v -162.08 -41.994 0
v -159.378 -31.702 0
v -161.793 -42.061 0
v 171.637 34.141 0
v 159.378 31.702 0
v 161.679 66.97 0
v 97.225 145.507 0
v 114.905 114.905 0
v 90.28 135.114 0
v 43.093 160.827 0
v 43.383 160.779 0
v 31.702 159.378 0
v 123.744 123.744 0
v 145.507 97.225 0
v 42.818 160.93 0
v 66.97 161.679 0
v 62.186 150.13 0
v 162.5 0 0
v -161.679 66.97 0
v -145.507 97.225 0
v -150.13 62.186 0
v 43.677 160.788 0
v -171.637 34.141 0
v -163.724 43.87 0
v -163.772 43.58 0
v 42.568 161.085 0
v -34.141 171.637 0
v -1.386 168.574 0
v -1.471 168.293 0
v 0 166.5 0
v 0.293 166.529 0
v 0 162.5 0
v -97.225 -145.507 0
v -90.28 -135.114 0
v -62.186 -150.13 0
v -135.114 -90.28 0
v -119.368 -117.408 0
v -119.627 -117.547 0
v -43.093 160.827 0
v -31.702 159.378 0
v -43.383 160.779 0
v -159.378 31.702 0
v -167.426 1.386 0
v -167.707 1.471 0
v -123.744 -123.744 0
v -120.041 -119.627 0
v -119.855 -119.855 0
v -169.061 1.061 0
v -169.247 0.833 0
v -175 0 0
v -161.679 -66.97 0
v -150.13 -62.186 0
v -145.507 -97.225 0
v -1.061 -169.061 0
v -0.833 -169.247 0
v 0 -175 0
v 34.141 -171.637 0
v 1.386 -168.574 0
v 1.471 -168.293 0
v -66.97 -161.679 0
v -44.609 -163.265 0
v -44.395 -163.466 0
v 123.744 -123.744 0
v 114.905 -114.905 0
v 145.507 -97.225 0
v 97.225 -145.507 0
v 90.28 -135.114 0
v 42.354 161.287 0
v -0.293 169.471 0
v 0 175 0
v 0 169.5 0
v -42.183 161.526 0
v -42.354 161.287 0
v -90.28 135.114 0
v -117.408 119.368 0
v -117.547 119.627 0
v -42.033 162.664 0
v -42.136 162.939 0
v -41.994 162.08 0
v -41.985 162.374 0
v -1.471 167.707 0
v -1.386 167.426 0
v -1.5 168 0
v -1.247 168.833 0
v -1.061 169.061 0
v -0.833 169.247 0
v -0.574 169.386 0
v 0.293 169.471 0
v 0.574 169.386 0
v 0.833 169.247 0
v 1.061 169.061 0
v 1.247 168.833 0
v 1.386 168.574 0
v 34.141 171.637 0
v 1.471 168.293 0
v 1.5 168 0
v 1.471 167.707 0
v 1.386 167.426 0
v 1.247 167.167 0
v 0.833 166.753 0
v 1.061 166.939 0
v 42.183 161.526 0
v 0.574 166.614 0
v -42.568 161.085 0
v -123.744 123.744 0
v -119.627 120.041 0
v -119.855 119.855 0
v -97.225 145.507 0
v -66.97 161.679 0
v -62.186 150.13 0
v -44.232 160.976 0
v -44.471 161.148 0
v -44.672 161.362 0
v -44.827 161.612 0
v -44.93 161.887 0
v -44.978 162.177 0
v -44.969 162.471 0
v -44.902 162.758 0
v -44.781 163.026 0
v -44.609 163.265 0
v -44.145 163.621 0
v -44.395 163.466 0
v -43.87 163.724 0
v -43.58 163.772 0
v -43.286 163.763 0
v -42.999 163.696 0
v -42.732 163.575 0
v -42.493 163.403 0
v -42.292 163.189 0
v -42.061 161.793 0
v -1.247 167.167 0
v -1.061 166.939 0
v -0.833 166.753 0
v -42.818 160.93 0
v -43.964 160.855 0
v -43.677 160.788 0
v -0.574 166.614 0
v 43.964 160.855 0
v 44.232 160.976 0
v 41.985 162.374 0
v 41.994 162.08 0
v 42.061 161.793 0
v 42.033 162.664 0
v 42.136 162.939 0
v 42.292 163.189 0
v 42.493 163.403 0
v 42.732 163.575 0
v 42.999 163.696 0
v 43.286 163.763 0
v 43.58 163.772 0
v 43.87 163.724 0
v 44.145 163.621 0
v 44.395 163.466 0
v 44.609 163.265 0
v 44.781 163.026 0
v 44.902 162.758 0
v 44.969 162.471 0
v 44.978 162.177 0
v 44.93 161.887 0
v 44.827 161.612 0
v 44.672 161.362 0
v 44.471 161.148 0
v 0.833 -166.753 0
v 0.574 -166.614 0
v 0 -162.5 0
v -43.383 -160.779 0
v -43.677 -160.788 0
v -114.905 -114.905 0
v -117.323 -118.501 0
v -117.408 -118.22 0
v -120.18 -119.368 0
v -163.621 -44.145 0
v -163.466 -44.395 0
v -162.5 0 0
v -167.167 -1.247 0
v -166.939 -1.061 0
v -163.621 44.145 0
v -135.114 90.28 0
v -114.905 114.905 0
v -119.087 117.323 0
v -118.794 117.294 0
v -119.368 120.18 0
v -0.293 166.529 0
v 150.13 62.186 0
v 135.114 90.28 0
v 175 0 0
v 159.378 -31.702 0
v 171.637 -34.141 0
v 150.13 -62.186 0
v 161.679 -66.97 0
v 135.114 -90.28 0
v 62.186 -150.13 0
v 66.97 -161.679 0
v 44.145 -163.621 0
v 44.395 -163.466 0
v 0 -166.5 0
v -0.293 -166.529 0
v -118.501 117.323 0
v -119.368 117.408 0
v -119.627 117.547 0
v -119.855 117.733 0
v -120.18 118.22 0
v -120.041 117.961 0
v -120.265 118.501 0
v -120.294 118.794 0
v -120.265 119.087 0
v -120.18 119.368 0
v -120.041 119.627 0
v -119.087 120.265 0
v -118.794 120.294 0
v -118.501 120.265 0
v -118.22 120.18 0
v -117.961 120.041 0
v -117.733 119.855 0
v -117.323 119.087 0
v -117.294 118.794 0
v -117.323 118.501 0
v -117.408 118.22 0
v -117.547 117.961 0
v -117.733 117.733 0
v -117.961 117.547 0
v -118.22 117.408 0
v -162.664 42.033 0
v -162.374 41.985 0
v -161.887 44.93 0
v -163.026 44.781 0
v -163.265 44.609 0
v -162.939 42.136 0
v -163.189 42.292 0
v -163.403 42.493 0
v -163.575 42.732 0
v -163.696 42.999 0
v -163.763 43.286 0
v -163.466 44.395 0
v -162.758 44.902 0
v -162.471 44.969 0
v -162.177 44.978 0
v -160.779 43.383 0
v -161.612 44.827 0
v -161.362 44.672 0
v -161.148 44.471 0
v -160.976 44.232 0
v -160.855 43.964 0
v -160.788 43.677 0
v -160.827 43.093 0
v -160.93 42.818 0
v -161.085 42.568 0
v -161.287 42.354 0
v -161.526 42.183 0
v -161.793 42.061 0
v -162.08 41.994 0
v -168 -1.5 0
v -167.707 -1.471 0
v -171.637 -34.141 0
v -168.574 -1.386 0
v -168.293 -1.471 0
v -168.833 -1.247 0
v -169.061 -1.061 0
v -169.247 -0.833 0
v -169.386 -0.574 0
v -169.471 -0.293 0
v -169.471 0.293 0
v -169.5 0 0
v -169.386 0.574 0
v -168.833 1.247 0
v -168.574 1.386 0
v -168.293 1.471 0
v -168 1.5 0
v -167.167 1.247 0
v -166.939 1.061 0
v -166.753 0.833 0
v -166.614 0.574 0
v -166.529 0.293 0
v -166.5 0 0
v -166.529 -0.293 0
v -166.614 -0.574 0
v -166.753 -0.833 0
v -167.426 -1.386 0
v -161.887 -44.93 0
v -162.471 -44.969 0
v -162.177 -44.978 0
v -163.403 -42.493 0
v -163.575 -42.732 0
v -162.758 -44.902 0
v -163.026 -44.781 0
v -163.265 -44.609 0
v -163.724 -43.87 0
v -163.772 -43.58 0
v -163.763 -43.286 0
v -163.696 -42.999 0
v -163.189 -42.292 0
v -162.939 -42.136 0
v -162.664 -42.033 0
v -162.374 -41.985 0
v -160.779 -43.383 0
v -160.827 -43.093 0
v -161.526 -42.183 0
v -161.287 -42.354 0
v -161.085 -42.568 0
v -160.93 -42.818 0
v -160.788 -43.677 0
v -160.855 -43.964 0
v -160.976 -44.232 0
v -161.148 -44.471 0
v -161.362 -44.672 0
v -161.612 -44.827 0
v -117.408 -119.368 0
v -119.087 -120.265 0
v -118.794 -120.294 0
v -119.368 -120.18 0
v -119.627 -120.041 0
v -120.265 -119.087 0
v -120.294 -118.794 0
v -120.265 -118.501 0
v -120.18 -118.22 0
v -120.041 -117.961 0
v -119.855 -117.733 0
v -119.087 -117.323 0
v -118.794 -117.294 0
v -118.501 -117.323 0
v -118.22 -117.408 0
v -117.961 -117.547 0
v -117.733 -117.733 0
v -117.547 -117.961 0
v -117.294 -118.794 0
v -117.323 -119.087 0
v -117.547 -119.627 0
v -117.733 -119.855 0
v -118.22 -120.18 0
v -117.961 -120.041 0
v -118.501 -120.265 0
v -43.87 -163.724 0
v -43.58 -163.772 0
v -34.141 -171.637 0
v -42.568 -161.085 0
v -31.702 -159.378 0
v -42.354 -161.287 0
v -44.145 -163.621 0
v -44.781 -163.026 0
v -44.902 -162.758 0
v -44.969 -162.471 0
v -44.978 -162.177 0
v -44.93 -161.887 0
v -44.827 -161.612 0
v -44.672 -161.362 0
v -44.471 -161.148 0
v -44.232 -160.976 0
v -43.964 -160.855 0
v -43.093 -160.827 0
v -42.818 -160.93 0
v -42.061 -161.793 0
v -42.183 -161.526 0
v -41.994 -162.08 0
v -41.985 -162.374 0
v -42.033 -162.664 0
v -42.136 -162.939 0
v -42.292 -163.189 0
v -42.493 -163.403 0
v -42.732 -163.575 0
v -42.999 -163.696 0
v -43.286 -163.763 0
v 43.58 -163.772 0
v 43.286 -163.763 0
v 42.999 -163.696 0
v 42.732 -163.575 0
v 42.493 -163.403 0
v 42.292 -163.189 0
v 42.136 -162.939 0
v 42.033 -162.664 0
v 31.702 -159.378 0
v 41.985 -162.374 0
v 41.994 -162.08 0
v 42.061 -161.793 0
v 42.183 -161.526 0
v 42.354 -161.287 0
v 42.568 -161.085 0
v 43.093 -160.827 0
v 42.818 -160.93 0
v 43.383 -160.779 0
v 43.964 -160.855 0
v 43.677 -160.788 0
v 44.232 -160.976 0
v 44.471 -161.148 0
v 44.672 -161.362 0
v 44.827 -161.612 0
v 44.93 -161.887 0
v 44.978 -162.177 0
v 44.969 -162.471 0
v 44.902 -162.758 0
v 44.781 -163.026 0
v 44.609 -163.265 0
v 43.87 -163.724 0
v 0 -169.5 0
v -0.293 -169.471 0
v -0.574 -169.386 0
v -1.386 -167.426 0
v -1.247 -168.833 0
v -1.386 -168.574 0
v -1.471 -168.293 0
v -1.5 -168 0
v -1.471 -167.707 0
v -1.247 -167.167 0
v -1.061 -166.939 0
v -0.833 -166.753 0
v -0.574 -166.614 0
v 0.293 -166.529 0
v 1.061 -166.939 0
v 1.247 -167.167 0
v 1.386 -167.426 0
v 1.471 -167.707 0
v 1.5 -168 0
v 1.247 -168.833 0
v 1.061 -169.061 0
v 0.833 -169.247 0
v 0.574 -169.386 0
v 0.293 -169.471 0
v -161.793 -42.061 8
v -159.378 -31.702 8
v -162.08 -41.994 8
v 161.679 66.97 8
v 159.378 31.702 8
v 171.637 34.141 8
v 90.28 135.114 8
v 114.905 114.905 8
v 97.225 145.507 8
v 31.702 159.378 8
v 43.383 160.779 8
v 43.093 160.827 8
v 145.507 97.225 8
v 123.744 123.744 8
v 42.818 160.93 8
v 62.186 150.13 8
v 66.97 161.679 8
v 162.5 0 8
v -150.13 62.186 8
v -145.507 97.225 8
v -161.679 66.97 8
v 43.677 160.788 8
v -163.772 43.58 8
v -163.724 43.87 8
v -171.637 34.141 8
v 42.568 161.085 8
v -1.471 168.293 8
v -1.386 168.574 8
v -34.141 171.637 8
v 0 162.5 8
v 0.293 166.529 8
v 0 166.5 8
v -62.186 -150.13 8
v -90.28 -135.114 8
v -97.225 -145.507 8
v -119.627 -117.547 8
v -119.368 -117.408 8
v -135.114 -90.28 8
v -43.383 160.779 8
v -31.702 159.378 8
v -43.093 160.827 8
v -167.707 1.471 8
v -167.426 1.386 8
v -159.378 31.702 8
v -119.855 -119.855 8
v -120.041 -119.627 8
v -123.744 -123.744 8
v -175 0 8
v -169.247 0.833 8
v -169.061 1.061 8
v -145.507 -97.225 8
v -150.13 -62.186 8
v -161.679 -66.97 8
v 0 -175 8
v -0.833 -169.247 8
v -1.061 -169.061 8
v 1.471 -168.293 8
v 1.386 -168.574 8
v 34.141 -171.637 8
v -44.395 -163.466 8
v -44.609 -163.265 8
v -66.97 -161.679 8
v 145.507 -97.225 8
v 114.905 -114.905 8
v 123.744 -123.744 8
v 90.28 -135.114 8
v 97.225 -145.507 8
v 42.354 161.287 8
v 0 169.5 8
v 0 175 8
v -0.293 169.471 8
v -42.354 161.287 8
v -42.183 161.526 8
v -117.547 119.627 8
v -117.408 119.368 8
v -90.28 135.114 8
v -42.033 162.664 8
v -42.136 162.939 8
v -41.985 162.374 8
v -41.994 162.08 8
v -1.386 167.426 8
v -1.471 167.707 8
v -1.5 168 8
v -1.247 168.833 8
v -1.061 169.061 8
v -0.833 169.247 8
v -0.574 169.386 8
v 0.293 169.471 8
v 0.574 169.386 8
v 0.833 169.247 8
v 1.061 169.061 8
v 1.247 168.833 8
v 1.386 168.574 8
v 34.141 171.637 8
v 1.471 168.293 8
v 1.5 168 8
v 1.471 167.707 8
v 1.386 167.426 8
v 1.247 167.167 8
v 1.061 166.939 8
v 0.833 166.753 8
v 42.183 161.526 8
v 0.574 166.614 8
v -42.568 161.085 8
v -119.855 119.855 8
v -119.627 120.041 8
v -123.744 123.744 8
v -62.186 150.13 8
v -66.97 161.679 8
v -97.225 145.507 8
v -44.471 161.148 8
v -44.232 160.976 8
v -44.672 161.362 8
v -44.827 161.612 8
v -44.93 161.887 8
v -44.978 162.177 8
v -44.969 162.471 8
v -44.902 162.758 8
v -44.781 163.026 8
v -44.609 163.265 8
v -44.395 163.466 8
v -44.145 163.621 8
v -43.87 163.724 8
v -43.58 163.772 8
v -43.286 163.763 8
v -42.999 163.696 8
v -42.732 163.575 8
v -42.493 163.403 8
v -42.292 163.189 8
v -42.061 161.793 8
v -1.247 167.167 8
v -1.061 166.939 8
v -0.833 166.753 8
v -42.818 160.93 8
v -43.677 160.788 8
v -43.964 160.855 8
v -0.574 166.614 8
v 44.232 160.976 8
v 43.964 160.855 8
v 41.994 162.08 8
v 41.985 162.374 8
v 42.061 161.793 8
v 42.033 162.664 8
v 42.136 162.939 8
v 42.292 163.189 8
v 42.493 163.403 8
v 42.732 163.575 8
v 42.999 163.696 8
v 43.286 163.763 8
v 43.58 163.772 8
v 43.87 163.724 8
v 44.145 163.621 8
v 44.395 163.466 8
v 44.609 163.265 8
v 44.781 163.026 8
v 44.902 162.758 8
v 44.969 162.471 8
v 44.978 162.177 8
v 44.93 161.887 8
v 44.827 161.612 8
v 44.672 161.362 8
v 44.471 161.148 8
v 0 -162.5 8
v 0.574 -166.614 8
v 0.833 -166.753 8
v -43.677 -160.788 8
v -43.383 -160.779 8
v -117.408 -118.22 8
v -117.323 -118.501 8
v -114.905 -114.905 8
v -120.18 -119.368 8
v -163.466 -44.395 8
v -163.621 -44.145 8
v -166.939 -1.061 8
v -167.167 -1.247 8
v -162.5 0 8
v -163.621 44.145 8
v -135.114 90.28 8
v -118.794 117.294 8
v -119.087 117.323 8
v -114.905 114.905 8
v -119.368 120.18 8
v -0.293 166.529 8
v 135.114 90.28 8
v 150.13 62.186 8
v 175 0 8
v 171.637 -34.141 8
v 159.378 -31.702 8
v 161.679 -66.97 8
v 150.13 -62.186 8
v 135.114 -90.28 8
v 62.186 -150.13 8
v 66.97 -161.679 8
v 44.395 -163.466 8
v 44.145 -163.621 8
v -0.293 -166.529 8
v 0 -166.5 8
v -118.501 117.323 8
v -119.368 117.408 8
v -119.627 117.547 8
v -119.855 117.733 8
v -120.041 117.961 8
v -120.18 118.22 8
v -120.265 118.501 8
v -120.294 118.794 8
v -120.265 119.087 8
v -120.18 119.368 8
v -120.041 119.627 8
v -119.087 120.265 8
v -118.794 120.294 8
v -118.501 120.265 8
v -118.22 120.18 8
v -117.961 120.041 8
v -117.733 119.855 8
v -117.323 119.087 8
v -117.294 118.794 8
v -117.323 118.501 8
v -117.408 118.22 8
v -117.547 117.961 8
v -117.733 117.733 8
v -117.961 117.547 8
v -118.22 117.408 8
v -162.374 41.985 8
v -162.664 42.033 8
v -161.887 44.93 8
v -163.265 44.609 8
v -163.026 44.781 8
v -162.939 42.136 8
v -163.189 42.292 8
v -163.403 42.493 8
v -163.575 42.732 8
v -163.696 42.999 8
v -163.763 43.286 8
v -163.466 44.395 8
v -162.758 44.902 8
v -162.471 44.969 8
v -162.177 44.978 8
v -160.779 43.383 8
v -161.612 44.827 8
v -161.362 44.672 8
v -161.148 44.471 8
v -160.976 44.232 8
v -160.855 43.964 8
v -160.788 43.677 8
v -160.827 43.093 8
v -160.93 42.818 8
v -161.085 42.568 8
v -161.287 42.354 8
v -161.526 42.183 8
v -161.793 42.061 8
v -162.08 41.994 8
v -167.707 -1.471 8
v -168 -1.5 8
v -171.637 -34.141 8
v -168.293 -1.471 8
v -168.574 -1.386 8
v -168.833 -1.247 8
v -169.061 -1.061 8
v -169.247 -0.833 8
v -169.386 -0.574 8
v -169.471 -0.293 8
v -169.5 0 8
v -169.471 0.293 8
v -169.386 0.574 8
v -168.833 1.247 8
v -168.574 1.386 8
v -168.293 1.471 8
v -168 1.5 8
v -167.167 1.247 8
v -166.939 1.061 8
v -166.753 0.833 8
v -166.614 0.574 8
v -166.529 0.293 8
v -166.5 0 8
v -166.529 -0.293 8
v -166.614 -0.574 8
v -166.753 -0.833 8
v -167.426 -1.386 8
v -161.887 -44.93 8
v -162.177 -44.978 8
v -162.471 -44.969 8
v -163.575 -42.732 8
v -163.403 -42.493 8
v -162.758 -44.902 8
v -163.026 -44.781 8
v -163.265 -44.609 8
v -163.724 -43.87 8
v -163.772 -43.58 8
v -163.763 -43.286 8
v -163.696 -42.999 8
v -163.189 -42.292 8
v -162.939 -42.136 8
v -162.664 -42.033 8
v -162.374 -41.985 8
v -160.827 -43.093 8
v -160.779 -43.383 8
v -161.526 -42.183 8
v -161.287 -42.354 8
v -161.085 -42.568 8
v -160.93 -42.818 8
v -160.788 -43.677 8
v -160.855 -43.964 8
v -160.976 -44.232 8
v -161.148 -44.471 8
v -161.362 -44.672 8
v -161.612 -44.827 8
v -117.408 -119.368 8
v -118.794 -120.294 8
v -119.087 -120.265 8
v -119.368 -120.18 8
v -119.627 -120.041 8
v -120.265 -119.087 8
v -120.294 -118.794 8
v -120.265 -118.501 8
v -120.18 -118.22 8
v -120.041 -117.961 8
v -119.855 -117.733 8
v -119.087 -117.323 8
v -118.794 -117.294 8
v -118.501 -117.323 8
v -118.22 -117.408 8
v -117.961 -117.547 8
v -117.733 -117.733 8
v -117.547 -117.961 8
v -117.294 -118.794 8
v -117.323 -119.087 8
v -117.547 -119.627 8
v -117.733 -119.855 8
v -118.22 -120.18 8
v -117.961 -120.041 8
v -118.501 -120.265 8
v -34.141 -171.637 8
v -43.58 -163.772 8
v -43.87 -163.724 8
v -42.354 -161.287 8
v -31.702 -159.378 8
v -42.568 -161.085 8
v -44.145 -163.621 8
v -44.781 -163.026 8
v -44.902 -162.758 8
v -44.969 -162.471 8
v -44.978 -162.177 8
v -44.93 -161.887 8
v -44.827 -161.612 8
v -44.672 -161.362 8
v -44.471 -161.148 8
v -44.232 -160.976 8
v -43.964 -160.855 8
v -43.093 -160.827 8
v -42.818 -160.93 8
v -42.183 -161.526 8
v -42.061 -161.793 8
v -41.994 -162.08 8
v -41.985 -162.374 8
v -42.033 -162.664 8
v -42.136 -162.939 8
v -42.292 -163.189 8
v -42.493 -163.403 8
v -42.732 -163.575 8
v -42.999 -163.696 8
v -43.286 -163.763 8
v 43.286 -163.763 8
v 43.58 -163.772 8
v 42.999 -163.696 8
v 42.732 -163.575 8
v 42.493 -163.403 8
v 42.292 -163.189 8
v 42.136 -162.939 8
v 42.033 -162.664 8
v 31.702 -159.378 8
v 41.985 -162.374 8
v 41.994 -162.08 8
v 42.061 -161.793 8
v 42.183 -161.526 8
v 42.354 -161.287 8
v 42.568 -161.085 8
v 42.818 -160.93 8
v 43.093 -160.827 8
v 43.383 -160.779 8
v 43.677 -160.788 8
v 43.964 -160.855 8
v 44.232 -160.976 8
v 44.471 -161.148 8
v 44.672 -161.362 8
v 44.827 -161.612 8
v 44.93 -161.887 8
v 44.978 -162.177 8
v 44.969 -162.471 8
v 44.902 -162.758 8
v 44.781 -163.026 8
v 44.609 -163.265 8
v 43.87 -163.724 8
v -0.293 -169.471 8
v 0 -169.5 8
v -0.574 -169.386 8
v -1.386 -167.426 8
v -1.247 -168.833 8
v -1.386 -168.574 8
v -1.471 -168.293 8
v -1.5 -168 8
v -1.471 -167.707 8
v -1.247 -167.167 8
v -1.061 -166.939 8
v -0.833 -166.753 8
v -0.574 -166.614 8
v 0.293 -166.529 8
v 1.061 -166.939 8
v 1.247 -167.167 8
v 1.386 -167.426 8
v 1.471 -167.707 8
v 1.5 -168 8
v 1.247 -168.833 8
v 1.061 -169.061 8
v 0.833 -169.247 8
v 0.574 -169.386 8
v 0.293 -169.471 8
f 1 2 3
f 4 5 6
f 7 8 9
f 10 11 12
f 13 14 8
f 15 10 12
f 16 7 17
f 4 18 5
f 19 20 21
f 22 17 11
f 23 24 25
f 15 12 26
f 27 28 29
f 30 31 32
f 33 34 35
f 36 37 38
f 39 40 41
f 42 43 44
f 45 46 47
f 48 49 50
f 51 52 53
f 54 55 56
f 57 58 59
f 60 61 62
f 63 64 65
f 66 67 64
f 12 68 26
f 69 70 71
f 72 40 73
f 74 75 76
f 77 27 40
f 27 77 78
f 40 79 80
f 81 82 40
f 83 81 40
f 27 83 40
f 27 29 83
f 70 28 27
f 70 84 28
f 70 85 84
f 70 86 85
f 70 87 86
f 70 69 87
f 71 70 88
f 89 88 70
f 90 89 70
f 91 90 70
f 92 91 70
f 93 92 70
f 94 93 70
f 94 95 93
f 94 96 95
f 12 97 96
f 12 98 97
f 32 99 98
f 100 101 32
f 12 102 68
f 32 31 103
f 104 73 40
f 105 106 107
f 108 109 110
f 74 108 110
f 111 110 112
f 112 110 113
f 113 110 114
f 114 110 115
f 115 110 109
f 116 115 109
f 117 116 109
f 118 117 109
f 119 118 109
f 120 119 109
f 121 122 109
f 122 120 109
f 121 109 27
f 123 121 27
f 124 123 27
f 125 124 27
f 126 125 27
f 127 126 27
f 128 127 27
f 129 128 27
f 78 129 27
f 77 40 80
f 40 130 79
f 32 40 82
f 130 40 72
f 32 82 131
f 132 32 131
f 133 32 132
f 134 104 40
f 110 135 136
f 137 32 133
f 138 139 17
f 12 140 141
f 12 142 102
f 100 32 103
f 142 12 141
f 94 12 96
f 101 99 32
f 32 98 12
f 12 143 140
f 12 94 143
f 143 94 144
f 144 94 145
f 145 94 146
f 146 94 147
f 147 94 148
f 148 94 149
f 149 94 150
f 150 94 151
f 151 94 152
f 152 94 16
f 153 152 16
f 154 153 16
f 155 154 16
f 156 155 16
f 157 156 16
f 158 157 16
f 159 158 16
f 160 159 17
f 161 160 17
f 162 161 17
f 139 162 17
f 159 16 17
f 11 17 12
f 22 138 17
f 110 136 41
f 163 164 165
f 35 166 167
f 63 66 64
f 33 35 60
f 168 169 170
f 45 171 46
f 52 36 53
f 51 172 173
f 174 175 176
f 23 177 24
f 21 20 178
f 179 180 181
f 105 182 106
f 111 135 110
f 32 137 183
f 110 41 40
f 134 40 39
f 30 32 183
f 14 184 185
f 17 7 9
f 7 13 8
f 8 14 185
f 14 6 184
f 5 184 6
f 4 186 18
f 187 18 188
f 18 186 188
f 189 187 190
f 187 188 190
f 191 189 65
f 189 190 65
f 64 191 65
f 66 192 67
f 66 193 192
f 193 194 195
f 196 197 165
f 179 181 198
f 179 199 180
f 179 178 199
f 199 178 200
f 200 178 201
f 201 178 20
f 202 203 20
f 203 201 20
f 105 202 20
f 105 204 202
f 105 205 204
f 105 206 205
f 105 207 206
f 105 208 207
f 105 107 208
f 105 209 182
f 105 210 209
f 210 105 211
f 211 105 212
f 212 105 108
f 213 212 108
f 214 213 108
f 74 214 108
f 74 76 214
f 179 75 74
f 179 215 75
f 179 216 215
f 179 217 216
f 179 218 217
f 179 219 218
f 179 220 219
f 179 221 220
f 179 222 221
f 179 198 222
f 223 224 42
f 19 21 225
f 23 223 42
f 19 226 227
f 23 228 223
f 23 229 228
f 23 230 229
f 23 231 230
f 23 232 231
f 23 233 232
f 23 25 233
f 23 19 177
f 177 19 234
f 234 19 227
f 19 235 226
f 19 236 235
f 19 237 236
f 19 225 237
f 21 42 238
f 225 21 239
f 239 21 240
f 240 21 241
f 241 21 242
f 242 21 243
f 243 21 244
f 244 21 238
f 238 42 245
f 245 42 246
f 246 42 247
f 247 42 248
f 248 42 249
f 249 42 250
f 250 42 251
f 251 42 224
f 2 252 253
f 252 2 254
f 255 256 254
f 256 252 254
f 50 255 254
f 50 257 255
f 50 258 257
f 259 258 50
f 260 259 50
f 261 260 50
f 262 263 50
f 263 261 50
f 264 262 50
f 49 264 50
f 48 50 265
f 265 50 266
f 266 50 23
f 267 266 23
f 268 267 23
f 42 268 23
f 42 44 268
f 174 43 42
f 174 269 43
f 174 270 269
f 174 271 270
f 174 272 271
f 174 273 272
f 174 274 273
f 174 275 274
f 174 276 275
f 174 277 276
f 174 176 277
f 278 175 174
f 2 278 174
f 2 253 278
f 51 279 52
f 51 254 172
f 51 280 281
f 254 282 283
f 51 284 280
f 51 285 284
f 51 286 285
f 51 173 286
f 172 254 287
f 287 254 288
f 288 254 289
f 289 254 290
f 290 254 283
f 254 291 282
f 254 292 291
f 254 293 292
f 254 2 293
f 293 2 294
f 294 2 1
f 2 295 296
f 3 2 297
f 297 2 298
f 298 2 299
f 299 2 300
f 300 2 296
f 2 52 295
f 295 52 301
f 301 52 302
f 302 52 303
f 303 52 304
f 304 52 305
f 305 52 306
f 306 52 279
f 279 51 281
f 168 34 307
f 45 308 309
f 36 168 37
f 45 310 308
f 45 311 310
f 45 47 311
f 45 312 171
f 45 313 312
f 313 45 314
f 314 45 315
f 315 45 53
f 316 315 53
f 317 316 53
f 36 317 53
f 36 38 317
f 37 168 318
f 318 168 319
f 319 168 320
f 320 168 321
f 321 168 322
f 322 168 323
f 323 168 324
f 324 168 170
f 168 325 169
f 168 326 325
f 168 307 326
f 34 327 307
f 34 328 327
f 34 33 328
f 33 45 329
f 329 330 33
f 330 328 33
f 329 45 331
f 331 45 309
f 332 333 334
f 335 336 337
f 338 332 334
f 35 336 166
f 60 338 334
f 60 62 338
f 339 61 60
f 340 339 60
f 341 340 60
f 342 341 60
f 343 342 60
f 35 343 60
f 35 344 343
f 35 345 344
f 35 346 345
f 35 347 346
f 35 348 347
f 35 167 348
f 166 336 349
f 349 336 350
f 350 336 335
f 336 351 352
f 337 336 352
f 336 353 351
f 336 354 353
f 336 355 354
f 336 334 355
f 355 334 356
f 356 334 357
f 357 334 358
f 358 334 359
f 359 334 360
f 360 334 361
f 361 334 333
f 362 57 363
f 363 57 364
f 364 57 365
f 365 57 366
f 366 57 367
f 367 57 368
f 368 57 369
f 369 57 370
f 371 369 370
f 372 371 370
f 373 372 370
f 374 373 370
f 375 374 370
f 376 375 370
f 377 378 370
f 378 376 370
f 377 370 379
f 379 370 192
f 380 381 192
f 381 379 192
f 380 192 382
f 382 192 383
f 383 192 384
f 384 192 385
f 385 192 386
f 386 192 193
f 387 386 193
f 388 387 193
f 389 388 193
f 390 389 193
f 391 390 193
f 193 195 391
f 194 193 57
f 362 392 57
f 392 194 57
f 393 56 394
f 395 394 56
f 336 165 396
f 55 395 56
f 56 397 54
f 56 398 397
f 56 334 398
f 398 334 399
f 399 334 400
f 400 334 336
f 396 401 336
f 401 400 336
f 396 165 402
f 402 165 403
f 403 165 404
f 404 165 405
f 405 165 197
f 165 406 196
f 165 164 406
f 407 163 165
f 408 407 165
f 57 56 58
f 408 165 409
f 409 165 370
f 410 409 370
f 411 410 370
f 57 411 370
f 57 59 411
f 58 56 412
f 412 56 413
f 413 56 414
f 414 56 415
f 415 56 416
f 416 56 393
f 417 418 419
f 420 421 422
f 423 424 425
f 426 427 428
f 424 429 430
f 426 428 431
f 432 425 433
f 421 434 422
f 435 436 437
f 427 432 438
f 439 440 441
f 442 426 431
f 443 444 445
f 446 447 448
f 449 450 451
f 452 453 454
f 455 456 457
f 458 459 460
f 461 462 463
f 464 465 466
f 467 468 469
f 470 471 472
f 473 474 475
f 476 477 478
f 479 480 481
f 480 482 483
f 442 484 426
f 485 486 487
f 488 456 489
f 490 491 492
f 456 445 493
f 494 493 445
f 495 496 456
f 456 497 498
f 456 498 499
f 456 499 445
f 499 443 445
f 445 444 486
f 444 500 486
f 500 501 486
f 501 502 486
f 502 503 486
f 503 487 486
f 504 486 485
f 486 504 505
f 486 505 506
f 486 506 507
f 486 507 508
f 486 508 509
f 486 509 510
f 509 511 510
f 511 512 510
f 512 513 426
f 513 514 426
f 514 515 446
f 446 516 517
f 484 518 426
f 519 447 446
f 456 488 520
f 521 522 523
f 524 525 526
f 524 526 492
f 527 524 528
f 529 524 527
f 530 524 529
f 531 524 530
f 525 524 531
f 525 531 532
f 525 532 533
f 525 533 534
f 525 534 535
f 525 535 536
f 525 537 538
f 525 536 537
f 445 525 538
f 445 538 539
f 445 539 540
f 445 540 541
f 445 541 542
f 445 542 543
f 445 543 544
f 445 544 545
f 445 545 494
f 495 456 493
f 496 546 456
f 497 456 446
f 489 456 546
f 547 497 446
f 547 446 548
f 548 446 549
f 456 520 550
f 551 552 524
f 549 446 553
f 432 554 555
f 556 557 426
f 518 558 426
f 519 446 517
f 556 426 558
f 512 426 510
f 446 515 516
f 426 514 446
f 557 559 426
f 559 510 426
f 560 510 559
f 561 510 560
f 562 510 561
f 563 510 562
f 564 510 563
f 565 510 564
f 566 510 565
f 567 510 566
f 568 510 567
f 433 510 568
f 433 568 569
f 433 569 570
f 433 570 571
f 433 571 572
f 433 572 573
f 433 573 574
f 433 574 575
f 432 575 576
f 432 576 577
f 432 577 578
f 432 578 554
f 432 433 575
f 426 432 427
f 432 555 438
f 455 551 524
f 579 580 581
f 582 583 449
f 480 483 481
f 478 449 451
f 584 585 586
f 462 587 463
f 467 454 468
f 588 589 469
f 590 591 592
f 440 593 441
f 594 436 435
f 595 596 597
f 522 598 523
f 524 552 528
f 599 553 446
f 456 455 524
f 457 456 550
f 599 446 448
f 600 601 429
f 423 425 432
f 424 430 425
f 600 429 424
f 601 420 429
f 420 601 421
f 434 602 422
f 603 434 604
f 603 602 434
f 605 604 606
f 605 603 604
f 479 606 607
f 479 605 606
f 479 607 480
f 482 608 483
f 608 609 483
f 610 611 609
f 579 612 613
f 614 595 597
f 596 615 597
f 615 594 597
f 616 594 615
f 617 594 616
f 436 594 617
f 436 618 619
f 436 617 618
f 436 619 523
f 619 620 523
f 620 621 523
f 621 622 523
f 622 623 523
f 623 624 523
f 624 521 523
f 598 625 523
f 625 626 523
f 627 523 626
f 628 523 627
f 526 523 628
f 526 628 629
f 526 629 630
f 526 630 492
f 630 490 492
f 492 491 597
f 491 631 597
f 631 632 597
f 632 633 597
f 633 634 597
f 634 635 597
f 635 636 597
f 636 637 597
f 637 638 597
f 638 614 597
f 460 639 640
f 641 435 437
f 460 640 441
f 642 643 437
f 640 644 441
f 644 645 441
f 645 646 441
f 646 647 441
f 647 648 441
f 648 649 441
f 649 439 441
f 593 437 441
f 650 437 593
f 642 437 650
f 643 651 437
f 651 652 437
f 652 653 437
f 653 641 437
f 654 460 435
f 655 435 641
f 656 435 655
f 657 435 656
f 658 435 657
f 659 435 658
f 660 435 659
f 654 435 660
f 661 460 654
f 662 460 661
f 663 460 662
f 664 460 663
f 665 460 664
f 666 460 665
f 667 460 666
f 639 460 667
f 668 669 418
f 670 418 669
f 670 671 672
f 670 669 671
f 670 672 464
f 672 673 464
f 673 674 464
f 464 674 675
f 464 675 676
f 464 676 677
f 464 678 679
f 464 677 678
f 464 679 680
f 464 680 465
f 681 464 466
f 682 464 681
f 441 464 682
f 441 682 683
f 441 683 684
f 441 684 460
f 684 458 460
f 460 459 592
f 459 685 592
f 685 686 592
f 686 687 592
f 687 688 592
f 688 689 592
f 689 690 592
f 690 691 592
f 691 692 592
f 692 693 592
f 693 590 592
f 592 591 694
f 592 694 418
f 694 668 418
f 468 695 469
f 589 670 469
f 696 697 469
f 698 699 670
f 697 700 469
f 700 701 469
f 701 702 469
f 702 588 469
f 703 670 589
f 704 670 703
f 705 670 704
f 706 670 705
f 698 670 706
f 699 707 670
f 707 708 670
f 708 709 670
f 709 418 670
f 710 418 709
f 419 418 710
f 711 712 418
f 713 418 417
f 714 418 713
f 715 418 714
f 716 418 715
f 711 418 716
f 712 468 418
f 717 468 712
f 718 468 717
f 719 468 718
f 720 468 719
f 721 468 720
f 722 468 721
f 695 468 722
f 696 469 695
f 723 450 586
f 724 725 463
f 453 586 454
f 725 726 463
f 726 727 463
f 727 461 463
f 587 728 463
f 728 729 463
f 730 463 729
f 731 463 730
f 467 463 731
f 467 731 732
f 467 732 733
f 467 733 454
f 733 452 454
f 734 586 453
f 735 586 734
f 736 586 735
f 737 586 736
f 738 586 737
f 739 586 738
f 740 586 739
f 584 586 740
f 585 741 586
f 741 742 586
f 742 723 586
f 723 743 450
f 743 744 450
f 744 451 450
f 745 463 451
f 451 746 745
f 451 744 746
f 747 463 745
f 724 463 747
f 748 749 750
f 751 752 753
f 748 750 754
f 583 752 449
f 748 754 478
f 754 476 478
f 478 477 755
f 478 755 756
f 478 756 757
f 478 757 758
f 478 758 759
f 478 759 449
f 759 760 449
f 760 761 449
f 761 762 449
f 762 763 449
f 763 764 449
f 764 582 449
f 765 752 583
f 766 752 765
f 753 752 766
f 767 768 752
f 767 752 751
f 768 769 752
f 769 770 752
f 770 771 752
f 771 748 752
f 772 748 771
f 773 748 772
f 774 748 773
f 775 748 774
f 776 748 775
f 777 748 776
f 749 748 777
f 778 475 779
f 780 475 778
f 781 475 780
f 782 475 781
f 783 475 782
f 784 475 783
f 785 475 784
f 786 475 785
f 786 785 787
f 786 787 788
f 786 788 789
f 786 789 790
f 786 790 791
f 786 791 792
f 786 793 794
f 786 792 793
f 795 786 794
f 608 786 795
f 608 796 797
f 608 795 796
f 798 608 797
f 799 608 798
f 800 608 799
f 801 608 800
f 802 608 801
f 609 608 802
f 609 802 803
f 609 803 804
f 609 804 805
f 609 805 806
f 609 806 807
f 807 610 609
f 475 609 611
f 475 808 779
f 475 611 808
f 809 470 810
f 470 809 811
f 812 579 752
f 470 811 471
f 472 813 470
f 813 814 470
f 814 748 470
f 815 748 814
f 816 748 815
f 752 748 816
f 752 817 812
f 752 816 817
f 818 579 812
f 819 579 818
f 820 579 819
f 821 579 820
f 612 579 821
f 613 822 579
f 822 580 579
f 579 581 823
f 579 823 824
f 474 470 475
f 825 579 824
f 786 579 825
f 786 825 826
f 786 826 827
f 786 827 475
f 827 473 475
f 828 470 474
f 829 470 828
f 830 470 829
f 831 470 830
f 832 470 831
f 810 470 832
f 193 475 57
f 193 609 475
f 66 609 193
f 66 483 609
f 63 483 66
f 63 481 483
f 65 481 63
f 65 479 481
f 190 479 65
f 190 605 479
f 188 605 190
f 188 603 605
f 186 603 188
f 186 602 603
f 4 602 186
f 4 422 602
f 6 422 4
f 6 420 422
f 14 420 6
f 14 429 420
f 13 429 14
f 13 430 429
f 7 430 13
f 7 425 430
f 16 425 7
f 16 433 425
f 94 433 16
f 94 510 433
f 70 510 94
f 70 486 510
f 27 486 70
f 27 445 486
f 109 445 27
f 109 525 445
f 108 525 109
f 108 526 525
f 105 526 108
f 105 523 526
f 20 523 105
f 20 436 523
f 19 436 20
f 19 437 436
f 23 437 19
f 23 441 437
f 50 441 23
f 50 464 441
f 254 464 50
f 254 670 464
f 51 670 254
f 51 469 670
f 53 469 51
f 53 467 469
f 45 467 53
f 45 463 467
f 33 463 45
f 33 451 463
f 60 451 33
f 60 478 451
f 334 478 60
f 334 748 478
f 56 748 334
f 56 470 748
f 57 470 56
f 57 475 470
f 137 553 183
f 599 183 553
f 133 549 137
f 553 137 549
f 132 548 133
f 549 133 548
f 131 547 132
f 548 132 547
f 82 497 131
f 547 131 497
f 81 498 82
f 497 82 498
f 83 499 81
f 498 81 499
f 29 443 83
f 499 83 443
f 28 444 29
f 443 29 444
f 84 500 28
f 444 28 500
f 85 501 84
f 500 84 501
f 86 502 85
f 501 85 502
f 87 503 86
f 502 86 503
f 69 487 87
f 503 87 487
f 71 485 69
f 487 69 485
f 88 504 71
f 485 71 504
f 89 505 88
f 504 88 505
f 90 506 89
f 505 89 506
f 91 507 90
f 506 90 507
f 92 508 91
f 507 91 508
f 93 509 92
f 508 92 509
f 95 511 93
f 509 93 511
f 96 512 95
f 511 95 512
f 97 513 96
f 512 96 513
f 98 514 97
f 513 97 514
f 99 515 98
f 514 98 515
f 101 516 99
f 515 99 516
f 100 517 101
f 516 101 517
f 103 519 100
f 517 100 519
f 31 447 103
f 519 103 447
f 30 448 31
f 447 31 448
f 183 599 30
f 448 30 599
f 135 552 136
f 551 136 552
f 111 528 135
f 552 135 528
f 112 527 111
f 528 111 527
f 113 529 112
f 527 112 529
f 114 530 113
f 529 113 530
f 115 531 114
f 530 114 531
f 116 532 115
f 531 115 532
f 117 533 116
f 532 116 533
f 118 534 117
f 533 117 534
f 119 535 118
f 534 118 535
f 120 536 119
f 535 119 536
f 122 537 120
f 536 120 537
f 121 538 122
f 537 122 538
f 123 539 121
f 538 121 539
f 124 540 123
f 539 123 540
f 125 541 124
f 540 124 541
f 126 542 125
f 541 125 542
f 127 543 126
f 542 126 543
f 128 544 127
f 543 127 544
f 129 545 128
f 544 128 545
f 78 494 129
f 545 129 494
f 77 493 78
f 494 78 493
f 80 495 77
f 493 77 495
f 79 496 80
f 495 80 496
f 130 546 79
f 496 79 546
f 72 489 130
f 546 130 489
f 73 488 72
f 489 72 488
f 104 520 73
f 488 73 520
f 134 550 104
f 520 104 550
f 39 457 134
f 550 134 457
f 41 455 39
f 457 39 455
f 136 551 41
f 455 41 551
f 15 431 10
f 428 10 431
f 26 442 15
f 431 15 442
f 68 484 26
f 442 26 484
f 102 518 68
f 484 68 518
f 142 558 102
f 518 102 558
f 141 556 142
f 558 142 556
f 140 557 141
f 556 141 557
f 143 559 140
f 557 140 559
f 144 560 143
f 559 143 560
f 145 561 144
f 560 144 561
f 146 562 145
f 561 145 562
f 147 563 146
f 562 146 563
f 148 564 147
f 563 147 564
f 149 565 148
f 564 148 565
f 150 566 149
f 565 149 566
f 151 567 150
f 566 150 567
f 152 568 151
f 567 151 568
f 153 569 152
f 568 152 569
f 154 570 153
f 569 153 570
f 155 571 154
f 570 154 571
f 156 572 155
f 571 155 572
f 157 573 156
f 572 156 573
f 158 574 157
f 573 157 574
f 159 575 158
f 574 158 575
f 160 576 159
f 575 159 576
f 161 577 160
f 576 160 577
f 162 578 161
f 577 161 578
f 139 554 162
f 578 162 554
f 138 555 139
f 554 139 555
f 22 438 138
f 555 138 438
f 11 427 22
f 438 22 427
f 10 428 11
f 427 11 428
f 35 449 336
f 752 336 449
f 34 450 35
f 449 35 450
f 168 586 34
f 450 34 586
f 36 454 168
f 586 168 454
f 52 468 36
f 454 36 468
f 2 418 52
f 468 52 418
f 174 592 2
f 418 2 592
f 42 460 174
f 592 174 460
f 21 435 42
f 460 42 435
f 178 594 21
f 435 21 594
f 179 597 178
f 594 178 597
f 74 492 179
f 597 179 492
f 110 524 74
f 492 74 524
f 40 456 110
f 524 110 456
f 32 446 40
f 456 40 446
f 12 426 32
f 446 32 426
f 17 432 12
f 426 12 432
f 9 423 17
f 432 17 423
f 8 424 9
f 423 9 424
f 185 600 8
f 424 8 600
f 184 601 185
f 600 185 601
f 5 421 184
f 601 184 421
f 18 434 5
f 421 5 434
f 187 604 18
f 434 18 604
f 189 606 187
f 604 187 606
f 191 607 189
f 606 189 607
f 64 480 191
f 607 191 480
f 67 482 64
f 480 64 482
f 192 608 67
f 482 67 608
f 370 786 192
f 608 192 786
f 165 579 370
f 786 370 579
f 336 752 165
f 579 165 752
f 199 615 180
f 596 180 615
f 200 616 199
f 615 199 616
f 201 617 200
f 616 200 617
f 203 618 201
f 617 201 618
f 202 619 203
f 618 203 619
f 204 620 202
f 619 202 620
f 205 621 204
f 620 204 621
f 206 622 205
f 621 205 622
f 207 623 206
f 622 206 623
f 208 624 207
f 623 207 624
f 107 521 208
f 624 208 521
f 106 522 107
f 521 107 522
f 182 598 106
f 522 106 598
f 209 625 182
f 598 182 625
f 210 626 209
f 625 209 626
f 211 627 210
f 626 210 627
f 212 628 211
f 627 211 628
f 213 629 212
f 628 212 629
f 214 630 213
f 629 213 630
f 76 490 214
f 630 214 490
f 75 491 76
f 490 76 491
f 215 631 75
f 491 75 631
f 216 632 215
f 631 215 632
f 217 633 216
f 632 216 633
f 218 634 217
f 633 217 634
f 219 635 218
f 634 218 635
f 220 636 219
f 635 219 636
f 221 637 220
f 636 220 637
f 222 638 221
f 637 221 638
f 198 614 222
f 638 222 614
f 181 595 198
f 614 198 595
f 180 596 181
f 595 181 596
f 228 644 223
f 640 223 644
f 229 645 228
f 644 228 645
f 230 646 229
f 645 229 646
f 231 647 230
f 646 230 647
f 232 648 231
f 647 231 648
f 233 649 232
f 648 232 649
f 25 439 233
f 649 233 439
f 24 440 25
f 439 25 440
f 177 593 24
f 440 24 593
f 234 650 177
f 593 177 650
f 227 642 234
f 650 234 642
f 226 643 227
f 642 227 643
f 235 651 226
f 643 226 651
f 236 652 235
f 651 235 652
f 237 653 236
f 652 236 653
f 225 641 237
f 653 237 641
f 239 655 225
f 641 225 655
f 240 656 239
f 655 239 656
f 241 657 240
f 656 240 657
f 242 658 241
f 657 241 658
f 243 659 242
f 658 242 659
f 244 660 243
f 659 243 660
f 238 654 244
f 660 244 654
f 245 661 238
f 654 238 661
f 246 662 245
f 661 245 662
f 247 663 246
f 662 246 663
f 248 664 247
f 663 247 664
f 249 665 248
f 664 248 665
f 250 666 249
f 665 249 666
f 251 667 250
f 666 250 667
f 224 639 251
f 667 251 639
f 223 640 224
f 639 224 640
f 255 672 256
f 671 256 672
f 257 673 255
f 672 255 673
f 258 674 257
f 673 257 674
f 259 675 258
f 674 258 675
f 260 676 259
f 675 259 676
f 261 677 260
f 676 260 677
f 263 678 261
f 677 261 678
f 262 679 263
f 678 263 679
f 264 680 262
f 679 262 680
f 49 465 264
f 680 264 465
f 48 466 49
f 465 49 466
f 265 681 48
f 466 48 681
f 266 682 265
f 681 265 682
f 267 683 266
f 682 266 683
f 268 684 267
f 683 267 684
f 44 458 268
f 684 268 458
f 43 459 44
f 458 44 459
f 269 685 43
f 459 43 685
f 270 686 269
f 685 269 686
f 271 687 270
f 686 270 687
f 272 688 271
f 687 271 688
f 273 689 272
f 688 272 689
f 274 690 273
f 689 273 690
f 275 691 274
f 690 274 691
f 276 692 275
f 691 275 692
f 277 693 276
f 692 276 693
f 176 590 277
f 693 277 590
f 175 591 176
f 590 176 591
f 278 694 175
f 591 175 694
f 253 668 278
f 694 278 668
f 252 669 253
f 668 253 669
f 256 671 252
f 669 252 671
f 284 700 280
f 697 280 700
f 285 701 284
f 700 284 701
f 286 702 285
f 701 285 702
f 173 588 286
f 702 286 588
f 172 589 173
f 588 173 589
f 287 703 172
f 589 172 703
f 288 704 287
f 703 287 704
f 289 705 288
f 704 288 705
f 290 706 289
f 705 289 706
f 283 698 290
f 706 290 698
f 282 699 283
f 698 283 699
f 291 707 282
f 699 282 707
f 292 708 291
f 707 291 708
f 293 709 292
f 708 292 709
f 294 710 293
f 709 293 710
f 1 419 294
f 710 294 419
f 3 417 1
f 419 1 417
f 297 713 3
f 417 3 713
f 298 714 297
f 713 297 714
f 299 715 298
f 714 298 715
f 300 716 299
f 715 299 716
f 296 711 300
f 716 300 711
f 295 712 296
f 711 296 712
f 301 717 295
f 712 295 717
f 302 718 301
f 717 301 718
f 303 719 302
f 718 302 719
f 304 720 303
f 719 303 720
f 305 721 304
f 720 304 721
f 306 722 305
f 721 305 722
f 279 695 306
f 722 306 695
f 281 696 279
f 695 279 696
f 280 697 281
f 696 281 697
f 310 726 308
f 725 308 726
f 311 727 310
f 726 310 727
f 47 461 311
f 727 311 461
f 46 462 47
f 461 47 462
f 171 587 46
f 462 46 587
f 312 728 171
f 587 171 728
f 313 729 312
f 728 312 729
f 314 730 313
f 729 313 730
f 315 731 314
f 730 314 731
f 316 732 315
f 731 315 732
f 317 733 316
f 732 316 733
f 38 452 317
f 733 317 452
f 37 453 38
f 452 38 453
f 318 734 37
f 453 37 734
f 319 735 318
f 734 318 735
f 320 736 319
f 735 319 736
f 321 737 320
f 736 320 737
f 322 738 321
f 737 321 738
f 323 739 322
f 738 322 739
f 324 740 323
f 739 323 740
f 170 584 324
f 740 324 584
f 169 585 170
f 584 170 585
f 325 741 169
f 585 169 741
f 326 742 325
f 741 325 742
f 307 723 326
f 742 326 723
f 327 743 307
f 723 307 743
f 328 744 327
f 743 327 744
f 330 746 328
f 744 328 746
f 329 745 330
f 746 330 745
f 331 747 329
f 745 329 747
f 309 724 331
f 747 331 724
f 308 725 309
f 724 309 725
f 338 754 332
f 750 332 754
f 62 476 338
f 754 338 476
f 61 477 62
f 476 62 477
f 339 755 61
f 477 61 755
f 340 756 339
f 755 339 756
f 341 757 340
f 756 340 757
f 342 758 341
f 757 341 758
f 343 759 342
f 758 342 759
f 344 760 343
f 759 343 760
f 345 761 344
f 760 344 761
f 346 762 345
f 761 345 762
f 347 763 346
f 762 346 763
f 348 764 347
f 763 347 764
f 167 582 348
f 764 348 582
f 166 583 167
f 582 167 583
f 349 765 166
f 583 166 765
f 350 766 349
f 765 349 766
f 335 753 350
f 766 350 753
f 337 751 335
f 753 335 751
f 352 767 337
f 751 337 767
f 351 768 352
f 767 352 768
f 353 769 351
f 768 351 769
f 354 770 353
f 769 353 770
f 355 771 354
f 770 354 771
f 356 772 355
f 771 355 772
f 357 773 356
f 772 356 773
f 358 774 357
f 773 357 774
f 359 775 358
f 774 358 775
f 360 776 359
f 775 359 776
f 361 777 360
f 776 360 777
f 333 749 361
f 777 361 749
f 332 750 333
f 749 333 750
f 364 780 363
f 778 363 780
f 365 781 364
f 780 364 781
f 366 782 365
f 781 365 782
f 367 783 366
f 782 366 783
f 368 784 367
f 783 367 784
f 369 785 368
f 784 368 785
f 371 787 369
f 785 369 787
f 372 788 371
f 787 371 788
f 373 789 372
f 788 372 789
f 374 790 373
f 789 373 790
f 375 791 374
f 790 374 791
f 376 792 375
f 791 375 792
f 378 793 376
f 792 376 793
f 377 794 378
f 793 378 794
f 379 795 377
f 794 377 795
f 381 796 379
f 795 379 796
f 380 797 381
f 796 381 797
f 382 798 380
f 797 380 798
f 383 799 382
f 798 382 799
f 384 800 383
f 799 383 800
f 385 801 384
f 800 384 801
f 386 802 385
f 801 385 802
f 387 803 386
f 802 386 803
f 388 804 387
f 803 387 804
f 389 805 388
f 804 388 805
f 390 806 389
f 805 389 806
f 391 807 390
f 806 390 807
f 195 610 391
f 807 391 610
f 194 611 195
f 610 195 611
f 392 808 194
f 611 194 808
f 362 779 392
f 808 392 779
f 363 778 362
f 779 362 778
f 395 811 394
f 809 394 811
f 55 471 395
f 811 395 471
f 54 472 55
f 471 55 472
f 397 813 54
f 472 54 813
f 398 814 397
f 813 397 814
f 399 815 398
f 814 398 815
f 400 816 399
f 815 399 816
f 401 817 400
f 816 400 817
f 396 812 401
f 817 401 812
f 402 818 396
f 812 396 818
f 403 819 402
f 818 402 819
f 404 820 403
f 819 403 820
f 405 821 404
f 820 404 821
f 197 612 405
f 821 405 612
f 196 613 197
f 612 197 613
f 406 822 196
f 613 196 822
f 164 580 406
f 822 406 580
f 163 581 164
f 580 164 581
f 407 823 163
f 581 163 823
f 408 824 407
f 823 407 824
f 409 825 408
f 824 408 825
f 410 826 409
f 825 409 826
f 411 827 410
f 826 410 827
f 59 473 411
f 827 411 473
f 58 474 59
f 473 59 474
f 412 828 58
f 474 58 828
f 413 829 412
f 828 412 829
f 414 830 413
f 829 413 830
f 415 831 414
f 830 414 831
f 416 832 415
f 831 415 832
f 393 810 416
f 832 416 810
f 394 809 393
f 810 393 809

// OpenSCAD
// file: oem/generic/lib.scad
$fn = 32;

kEpsilon = 1e-1;

function property(table, key) = table[search([key], table)[0]][1];

module sector(radius, angles, fn = $fn) {
     r = radius / cos(180 / fn);
     step = -360 / fn;

     points = concat([[0, 0]],
                     [for(a = [angles[0] : step : angles[1] - 360])
                               [r * cos(a), r * sin(a)]
                          ],
                     [[r * cos(angles[1]), r * sin(angles[1])]]
          );

     difference() {
          circle(radius, $fn = fn);
          polygon(points);
     }
}

module ring(inner_radius, outer_radius, angles = [0, 360], fn = $fn) {
     difference() {
          sector(radius=outer_radius, angles=angles, fn=fn);
          sector(radius=inner_radius, angles=angles+[-kEpsilon, kEpsilon], fn=fn);
     }
}

module rounded_ring(inner_radius, outer_radius, angles = [0, 360], fn = $fn) {
     step_angle = 360 / fn;
     ring_width = outer_radius - inner_radius;
     ring_mean_radius = (outer_radius + inner_radius) / 2;
     for (theta = angles) {
          theta_d = theta / step_angle;
          theta_frac = (theta_d - floor(theta_d) - 0.5) * step_angle;
          rho = ring_mean_radius * cos(step_angle/2) / cos(theta_frac);
          rotate(theta)
          translate([rho, 0])
          circle(d=ring_width);
     }
     ring(inner_radius=inner_radius,
          outer_radius=outer_radius,
          angles=angles, fn=fn);
}

module fillet(r) {
     difference() {
          difference() {
               offset(r=-r - kEpsilon)
                    offset(delta=r) {
                    children();
               }
               offset(r=r)
                    offset(delta=-r) {
                    children();
               }
          }
          children();
     }
     offset(r=r)
          offset(delta=-r) {
          children();
     }
}

module bench_fillet(r, order=1000) {
     difference() {
          fillet(r) {
               translate([-order/2-kEpsilon, 0]) {
                    square([order, order], center=true);
               }
               children();
          }
          translate([-order/2-kEpsilon, 0]) {
               square([order+kEpsilon, order+kEpsilon], center=true);
          }
     }
}

module curved_bench_fillet(r, bench_radius, order=1000, internal=true) {
     difference() {
          fillet(r) {
               if (internal) {
                    translate([bench_radius, 0]) {
                         ring(inner_radius=bench_radius + kEpsilon, outer_radius=bench_radius * order);
                    }
               } else {
                    translate([-bench_radius, 0]) circle(r=bench_radius - kEpsilon);
               }
               children();
          }
          if (internal) {
               translate([bench_radius, 0]) {
                    ring(inner_radius=bench_radius,
                         outer_radius=bench_radius * order - kEpsilon);
               }
          } else {
               translate([-bench_radius, 0]) circle(r=bench_radius);
          }

     }
}


module window(side, position=[0, 0, 0], order=1000) {
    difference() {
        children();
        translate(position)  {
            difference() {
                square(order, center=true);
                square(side, center=true);
            }
        }
    }
}


module rounded_cylinder(diameter, height, fillet_radius, center) {
     translate([0, 0, ! center ? height/2 : 0]) {
          minkowski() {
               cylinder(d=(diameter - 2 * fillet_radius),
                        h=(height - 2 * fillet_radius),
                        center=true);
               sphere(r=fillet_radius);
          }
     }
}


module curved_support_xsection(support_radius, fillet_radius,
                               wall_inner_radius, wall_outer_radius,
                               hole_radius = 0, internal=true) {
     support_angular_width = (4 * support_radius / wall_outer_radius) * 180 / PI;
     wall_thickness = wall_outer_radius - wall_inner_radius;
     rotate([0, 0, internal ? 180 : 0]) {
          difference() {
               window(6*support_radius) {
                    curved_bench_fillet(fillet_radius, bench_radius=wall_inner_radius, internal=internal) {
                         hull() {
                              translate([support_radius + wall_thickness/2, 0]) {
                                   circle(r=support_radius);
                              }
                              rotate([0, 0, ! internal ? 180 : 0])
                              translate([wall_inner_radius + wall_thickness/2, 0]) {
                                   ring(inner_radius=wall_inner_radius,
                                        outer_radius=wall_outer_radius,
                                        angles=[180 - support_angular_width/2,
                                                180 + support_angular_width/2]);
                              }
                         }
                         rotate([0, 0, ! internal ? 180 : 0])
                         translate([wall_inner_radius + wall_thickness/2, 0]) {
                              ring(inner_radius=wall_inner_radius,
                                   outer_radius=wall_outer_radius,
                                   angles=[180 - support_angular_width,
                                           180 + support_angular_width]);
                         }
                    }
               }
               if (hole_radius > 0) {
                    translate([support_radius + wall_thickness/2, 0]) {
                         circle(r=hole_radius);
                    }
               }
          }
     }
}

module fill(upto=1000) {
     offset(delta=-upto) {
          offset(delta=upto) {
               children();
          }
     }
}

module outline(delta) {
     if (delta > 0) {
          difference() {
               offset(delta=delta) {
                    children();
               }
               children();
          }
     } else {
          difference() {
               children();
               offset(delta=delta) {
                    children();
               }
          }
     }
}

module duplicate(v) {
     children();
     mirror(v) children();
}

function steps(start, end, n) = [start:(end - start)/(n - 1):end];

function sigmoid(x) = 1.0 / (1.0 + exp(-x));

module sigmoid_profile(length, width, order=10, fn = $fn) {
     step = length / fn;
     points = concat(
          [[0, 0]],
          [for (x = [step:step:length-step]) [x, width * sigmoid(2 * order * ((x / length) - 0.5))]],
          [[length, width], [0, width]]

     );
     polygon(points=points);
}

module exp_nerve_xsection(height, length, decay_rate = 5, fn = $fn) {
     step = length / fn;
     points = concat(
          [[0, 0]],
          [for (x = [0:step:length-step]) [x, height * exp(-x/decay_rate)]],
          [[length, 0]]
          );
     polygon(points=points);
}

module exp_nerve(height, length, thickness, decay_rate = 3, fn = $fn) {
     rotate([90, 0, 0])
     linear_extrude(height=thickness, center=true) {
          exp_nerve_xsection(height, length, decay_rate, fn);
     }
}

module exp_corner_nerve(height, radius, angles, corner_radius = 0, decay_rate = 3, fn = $fn) {
     difference() {
          rotate_extrude() {
               if (corner_radius > 0) {
                    translate([corner_radius, 0, 0])
                    exp_nerve_xsection(height=height, length=radius, decay_rate=decay_rate, fn=fn);
               } else {
                    translate([-corner_radius, 0, 0])
                    mirror([1, 0, 0])
                    exp_nerve_xsection(height=height, length=radius, decay_rate=decay_rate, fn=fn);
               }
          }
          linear_extrude(height=2 * height, center=true) {
               sector(radius=radius + abs(corner_radius), angles=[angles[1], angles[0] + 360], fn=fn);
          }
     }
}
// file: oem/usb_type_a_panel_connector.scad
include <generic/lib.scad>;


function vUSBTypeAPanelConnectorDatasheet() =
     [["conn_height", 16.8], ["cutout_length", 12.3], ["cutout_width", 26.5],
      ["flare_height", 4.5], ["flare_length", 18], ["flare_width", 30.31]];


module mUSBTypeAPanelConnector() {
     module mUSBTypeAFemaleConnector() {
          rotate([0, 0, 90]) {
               translate([-53.92913818, 0.57096958, 0.19999933]) {
                    import("stl/usb_type_a_female_connector.stl");
               }
          }
     }

     datasheet = vUSBTypeAPanelConnectorDatasheet();
     flare_height = property(datasheet, "flare_height");
     flare_length = property(datasheet, "flare_length");
     flare_width = property(datasheet, "flare_width");
     linear_extrude(height=flare_height) {
          difference() {
               square([flare_length, flare_width], center=true);
               hull() projection() mUSBTypeAFemaleConnector();
          }
     }
     conn_height = property(datasheet, "conn_height");
     translate([0, 0, flare_height-conn_height/2]) {
          mUSBTypeAFemaleConnector();
     }
}


mUSBTypeAPanelConnector();
// file: oem/sma_female_bulkhead_connector.scad
module mSMAFemaleBulkheadConnectorCutuotSection() {
     difference() {
          circle(d=6.4);
          translate([0, -6.0, 0]) {
               square(6.4, center=true);
          }
     }
}


module mSMAFemaleBulkheadConnector() {
     rotate([0, 0, 90]) {
          translate ([0, 0, -12.5]) {
               rotate([0, -90, 0]) {
                    scale([25.4, 25.4, 25.4]) {  // inch to mm
                         import("stl/sma_female_bulkhead_connector.stl");
                    }
               }
          }
     }
}


mSMAFemaleBulkheadConnector();
// file: oem/rplidar_a1m8_r1.scad
function vRPLidarA1M8R1Datasheet() =
     [["working_width", 6], ["range", 6000]];


module mRPLidarA1M8R1() {
     translate([-35.14, 35, 0]) {
          rotate([90, 0, 0]) import("stl/RPLIDAR-A1M8-R1.stl");
     }
}
// file: oem/m3x12mm_phillips_screw.scad
function vM3x12mmPhillipsScrewDatasheet() =
     [["nominal_diameter", 3], ["max_head_diameter", 5.7], ["max_head_height", 2.4]];

module mM3x12mmPhillipsScrew() {
     import("stl/m3x12mm_phillips_screw.stl");
}

mM3x12mmPhillipsScrew();
// file: oem/16mm_led_pushbutton.scad
function v16mmLEDPushbuttonDatasheet() = [["cutout_diameter", 16]];


module m16mmLEDPushbutton() {
     rotate([0, 0, -90]) import("stl/16mm_led_pushbutton.stl");
}
// file: chassis_base.scad
include <generic/lib.scad>;

function vChassisBaseDatasheet() =
     let(outer_diameter=350, thickness=2, inner_diameter=outer_diameter - 2 * thickness,
         base_height=100, height=120, inner_height=height - 2 * thickness)
     [["outer_diameter", outer_diameter], ["inner_diameter", inner_diameter],
      ["base_height", base_height], ["height", height], ["inner_height", inner_height],
      ["thickness", thickness], ["support_diameter", 10], ["z_offset", 20], ["fillet_radius", 8]];

module mChassisOuterVolume() {
     datasheet = vChassisBaseDatasheet();
     rounded_cylinder(diameter=property(datasheet, "outer_diameter"),
                      height=property(datasheet, "height"),
                      fillet_radius=property(datasheet, "fillet_radius"));
}

module mChassisInnerVolume() {
     datasheet = vChassisBaseDatasheet();
     translate([0, 0, property(datasheet, "thickness")]) {
          rounded_cylinder(diameter=property(datasheet, "inner_diameter"),
                           height=property(datasheet, "inner_height"),
                           fillet_radius=property(datasheet, "fillet_radius"));
     }
}

module mChassisBBox() {
     datasheet = vChassisBaseDatasheet();
     chassis_height = property(datasheet, "height");
     chassis_outer_diameter = property(datasheet, "outer_diameter");
     translate([0., 0., chassis_height/2]) {
          cube([chassis_outer_diameter, chassis_outer_diameter, chassis_height], center=true);
     }
}

module mChassisShell() {
     difference() {
          mChassisOuterVolume();
          mChassisInnerVolume();
     }
}

module mChassisVolumeConstrain() {
     datasheet = vChassisBaseDatasheet();
     height = property(datasheet, "height");
     outer_diameter = property(datasheet, "outer_diameter");
     fillet_radius = property(datasheet, "fillet_radius");
     difference() {
          rounded_cylinder(diameter=outer_diameter,
                           height=height,
                           fillet_radius=fillet_radius);
          difference() {
               translate([0, 0, -kEpsilon]) {
                    rounded_cylinder(diameter=outer_diameter + kEpsilon,
                                     height=height + 2 * kEpsilon,
                                     fillet_radius=fillet_radius);
               }
               children();
          }
     }
}
// file: oem/5mm_flat_top_led.scad
function v5mmFlatTopLEDDatasheet() =
     [["diameter", 5], ["height", 5.3]];

module m5mmFlatTopLED() {

}
// main file
include <generic/lib.scad>;

use <oem/5mm_flat_top_led.scad>;

use <chassis_base.scad>;
use <chassis_base_cover.scad>;

function vChassisBayDatasheet() =
     let(outer_diameter=property(vChassisBaseDatasheet(), "outer_diameter"),
         height=property(vChassisBaseCoverDatasheet(), "bay_height"),
         width=25)
     [["outer_diameter", outer_diameter],
      ["inner_diameter", outer_diameter - width],
      ["height", height], ["width", width],
      ["light_source_angles", [30:60:360-30]],
      ["light_source_r_offset", outer_diameter - width/2]];

module mChassisBay() {
     datasheet = vChassisBayDatasheet();
     inner_diameter = property(datasheet, "inner_diameter");
     outer_diameter = property(datasheet, "outer_diameter");
     height = property(datasheet, "height");

     chassis_cover_datasheet = vChassisBaseCoverDatasheet();
     support_angles = concat(property(chassis_cover_datasheet, "support_angles"),
                             property(chassis_cover_datasheet, "bay_support_angles"));
     support_r_offset = property(chassis_cover_datasheet, "support_r_offset");

     support_screw_datasheet = vChassisCoverSupportScrewDatasheet();
     support_screw_diameter = property(support_screw_datasheet, "nominal_diameter");

     light_source_angles = property(datasheet, "light_source_angles");
     light_source_r_offset = property(datasheet, "light_source_r_offset");

     light_source_diameter = property(v5mmFlatTopLEDDatasheet(), "diameter");

     color("white", 0.3) {
          linear_extrude(height=height) {
               difference() {
                    ring(inner_radius=inner_diameter/2, outer_radius=outer_diameter/2);
                    for (angle = light_source_angles) {
                         rotate(angle) {
                              translate([light_source_r_offset, 0]) {
                                   circle(d=light_source_diameter);
                              }
                         }
                    }
                    for (angle = support_angles) {
                         rotate(angle) {
                              translate([support_r_offset, 0]) {
                                   circle(d=support_screw_diameter);
                              }
                         }
                    }
               }
          }
     }
}

mChassisBay();
